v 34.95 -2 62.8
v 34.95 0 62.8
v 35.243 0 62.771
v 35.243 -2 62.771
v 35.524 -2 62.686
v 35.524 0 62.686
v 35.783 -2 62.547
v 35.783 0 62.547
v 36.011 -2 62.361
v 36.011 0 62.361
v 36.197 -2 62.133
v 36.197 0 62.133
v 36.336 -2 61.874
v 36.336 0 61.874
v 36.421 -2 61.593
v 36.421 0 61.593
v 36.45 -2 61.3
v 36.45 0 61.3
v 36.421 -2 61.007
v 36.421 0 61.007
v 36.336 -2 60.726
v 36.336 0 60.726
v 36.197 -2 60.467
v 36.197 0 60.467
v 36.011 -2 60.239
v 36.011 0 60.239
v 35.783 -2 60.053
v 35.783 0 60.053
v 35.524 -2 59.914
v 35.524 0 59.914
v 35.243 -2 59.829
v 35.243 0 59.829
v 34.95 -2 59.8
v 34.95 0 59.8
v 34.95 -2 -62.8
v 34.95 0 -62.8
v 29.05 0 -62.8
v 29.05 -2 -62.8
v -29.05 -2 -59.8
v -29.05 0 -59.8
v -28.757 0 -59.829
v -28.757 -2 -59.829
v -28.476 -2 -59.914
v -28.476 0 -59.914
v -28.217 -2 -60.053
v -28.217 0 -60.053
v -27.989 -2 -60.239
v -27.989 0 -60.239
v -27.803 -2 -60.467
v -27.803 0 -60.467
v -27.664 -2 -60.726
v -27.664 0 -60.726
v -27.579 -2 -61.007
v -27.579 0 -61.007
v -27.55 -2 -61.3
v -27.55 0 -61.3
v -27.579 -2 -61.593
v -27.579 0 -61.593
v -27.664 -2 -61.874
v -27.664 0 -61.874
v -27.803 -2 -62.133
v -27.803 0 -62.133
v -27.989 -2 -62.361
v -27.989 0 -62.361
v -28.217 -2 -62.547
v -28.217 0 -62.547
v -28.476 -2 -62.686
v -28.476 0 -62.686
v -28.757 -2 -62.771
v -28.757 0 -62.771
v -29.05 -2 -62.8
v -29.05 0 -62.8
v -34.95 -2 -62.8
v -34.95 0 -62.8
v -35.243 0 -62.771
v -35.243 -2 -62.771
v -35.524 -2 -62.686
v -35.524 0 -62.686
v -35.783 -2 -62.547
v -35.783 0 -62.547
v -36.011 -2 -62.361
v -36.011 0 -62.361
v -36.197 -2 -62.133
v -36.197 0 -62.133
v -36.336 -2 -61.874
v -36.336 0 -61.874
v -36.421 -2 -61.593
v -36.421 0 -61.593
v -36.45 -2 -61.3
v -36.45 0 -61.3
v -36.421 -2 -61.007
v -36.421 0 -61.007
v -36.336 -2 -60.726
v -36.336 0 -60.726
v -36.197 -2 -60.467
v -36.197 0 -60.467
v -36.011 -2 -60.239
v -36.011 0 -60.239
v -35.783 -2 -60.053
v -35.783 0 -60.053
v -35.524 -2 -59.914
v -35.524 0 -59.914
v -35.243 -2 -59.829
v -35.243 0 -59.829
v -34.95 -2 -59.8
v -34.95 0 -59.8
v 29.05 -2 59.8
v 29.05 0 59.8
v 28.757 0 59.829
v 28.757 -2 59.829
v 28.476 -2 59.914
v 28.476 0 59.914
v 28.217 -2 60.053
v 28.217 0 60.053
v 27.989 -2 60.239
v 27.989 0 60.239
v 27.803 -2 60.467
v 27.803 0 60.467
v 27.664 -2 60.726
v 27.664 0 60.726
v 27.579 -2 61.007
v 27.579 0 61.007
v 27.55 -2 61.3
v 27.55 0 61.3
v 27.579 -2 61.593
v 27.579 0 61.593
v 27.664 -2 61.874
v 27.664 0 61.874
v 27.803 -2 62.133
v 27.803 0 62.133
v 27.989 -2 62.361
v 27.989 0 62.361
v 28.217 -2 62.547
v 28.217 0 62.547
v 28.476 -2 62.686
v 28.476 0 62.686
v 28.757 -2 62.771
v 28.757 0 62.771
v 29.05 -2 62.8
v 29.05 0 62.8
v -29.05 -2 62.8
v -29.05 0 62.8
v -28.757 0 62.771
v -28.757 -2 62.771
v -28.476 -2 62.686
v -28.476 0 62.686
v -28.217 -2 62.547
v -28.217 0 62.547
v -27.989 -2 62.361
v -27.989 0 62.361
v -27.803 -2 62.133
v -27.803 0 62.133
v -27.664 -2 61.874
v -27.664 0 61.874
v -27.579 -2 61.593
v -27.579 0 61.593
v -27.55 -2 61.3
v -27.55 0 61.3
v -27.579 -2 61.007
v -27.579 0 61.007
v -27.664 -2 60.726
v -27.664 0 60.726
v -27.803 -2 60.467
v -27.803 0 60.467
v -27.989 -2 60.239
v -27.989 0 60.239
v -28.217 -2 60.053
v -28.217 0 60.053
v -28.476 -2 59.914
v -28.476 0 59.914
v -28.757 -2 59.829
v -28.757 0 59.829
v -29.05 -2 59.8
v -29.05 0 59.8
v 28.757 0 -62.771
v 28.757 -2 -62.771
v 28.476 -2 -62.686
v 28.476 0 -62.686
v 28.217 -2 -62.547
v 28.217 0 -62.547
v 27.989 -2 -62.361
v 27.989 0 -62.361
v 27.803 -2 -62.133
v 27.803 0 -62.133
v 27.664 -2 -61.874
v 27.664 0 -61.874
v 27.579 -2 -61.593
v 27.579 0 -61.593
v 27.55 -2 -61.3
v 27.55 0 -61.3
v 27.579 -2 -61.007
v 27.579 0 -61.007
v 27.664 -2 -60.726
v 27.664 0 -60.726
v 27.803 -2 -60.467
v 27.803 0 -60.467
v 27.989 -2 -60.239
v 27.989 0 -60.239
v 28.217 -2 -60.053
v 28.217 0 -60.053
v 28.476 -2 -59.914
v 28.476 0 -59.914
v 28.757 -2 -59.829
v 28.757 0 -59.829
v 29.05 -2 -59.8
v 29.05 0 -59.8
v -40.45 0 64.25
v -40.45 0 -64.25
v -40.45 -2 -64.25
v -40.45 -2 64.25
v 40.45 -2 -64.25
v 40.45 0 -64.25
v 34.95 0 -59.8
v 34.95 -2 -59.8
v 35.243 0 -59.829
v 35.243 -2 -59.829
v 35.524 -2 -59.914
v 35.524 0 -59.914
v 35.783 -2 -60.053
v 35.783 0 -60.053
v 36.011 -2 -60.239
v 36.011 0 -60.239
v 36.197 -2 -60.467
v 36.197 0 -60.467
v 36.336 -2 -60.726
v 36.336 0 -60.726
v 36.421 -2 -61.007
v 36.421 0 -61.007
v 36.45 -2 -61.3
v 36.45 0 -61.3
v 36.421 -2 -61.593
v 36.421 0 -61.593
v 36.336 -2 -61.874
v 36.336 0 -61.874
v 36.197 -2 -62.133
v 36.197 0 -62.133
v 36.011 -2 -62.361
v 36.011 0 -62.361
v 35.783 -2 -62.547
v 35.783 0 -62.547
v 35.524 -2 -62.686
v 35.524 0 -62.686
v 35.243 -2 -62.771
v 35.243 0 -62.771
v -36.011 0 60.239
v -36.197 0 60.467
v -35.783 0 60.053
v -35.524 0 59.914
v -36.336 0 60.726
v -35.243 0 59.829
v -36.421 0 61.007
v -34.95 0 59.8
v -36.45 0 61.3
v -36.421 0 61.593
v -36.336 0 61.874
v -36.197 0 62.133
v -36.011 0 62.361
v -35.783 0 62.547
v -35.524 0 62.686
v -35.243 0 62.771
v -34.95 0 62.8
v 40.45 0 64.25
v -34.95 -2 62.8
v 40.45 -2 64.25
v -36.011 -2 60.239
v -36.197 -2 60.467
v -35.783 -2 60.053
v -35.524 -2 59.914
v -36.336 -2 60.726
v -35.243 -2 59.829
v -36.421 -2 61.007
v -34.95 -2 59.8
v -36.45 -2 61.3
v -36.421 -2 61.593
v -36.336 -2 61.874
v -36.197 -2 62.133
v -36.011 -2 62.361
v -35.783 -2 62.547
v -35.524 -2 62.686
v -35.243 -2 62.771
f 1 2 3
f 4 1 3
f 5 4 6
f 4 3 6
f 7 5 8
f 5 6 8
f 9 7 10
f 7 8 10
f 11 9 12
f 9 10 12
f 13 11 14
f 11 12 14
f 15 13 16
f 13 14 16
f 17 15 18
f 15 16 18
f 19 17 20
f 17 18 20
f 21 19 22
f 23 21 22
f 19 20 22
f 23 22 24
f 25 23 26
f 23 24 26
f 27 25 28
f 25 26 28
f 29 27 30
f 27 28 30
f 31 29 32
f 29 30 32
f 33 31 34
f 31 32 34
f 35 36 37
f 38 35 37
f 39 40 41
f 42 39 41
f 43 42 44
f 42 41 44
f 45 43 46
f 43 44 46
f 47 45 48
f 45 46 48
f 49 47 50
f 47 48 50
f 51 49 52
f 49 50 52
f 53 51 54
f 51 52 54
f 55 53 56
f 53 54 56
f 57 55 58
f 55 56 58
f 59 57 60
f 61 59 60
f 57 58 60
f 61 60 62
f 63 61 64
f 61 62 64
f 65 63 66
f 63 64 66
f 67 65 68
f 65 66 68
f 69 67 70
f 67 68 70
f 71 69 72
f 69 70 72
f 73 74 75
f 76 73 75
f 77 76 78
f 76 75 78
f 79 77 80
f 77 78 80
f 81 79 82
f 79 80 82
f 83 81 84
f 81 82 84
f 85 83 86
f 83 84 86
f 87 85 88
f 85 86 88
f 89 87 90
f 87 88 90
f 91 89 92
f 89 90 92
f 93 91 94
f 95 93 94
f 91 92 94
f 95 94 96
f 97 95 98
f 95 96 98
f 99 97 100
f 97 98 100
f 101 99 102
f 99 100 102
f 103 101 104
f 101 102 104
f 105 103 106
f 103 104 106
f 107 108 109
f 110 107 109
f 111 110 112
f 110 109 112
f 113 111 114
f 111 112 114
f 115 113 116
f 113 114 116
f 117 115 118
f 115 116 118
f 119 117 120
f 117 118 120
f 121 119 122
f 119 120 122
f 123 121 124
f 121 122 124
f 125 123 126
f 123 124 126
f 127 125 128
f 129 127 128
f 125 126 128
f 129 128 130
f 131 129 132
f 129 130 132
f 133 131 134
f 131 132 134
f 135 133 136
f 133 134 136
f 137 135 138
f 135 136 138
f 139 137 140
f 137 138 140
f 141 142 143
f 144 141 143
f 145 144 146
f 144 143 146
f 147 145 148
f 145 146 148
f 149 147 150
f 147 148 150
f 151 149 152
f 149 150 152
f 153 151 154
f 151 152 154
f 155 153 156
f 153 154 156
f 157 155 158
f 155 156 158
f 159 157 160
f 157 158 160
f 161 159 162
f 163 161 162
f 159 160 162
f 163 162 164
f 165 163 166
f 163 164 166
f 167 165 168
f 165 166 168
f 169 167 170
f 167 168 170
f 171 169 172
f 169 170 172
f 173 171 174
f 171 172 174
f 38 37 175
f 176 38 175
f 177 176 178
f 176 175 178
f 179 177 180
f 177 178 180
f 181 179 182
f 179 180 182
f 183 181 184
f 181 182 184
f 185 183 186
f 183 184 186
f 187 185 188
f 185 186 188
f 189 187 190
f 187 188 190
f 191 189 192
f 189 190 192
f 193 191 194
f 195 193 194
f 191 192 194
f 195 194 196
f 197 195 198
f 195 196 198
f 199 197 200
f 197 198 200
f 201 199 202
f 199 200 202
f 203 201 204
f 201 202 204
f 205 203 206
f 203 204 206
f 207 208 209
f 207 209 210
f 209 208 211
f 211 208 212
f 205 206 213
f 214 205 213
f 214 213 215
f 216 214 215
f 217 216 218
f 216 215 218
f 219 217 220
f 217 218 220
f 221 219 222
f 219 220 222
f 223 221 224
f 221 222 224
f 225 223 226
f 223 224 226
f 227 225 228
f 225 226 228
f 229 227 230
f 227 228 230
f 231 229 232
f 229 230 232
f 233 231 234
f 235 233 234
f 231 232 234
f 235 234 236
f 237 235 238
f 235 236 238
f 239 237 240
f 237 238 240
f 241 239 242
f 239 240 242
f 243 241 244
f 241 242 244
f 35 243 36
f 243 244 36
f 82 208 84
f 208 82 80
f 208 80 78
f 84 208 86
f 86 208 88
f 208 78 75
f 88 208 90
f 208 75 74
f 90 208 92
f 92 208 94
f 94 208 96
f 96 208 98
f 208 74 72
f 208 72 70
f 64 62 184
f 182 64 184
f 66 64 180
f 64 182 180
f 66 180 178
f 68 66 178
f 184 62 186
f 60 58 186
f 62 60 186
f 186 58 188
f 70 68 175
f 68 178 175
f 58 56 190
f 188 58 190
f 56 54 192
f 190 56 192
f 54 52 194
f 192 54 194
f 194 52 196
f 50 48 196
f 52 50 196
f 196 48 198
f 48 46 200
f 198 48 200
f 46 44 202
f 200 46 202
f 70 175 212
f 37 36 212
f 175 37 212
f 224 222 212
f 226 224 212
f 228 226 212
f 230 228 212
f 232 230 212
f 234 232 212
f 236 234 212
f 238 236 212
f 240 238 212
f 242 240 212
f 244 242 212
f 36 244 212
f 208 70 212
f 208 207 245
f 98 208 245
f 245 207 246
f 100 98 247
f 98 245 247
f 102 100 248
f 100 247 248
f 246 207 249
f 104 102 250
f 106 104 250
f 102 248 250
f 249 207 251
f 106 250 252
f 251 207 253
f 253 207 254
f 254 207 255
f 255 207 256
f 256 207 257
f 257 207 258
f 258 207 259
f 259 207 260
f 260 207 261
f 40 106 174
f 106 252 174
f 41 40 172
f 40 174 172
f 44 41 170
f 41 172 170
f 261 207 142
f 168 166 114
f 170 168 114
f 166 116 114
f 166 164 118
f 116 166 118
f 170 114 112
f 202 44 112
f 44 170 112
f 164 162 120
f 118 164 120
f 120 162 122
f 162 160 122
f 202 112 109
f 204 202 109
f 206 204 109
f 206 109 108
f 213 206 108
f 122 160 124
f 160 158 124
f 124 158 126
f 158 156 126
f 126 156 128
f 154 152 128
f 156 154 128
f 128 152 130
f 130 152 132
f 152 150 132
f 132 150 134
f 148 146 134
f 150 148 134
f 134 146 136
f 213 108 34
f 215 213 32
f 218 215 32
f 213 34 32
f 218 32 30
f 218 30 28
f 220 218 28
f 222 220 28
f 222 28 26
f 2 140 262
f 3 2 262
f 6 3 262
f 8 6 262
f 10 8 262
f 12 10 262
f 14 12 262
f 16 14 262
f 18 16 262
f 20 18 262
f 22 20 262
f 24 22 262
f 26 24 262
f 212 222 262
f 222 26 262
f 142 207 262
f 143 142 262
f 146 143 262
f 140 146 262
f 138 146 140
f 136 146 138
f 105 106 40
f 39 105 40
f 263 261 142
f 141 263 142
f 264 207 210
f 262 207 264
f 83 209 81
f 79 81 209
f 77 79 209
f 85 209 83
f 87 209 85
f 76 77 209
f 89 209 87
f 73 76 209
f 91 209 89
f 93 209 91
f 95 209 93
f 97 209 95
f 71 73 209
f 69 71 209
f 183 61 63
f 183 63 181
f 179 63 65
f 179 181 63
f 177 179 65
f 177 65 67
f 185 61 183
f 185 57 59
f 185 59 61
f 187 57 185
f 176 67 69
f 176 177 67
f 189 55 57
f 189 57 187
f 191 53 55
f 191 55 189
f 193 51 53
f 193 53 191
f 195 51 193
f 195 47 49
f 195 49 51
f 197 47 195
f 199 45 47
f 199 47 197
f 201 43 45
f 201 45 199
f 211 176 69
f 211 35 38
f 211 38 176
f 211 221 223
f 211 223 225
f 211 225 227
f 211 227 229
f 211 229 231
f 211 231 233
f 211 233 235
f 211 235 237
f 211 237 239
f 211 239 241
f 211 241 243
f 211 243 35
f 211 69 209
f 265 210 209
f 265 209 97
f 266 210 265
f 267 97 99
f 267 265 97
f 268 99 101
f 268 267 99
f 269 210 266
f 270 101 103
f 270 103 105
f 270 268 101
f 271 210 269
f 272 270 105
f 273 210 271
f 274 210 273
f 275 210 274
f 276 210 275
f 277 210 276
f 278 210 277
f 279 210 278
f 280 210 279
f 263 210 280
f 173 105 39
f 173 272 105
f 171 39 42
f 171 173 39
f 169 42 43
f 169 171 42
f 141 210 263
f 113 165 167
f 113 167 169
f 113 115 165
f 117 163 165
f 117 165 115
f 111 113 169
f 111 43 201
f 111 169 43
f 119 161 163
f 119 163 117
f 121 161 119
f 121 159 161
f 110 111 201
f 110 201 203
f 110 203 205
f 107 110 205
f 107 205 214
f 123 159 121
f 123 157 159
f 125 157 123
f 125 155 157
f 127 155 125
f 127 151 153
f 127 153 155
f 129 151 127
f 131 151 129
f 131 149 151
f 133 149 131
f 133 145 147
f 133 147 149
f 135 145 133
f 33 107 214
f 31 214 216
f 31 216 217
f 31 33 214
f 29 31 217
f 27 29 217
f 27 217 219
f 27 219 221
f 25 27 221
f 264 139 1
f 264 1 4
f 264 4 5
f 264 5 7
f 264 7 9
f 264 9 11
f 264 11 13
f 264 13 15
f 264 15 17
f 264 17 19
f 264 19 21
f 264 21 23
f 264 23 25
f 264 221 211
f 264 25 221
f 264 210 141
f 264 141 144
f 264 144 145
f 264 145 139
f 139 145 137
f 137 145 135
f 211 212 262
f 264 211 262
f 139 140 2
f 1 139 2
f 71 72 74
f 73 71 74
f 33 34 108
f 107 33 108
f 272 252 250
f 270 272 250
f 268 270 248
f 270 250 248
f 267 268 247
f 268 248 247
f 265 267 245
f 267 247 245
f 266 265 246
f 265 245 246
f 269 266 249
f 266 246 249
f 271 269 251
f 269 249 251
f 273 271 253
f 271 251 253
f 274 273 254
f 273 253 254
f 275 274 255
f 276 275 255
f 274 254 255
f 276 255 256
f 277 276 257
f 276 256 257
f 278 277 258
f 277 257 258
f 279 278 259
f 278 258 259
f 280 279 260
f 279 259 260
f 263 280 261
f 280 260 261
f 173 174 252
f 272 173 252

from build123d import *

# Parameters (mm, degrees)
F0_W     = 80.9
F0_H     = 128.5
F1_DEPTH = 2


with BuildPart() as f1:
    # F0 (on Front) → F1 (new body)
    with BuildSketch(Plane.XZ):
        Rectangle(F0_W, F0_H)
        with BuildLine():
            ThreePointArc((-34.95, -62.8), (-36.45, -61.3), (-34.95, -59.8))
            Line((-34.95, -59.8), (-29.05, -59.8))
            ThreePointArc((-29.05, -59.8), (-27.55, -61.3), (-29.05, -62.8))
            Line((-29.05, -62.8), (-34.95, -62.8))
        make_face(mode=Mode.SUBTRACT)
        with BuildLine():
            ThreePointArc((29.05, -62.8), (27.55, -61.3), (29.05, -59.8))
            Line((29.05, -59.8), (34.95, -59.8))
            ThreePointArc((34.95, -59.8), (36.45, -61.3), (34.95, -62.8))
            Line((34.95, -62.8), (29.05, -62.8))
        make_face(mode=Mode.SUBTRACT)
        with BuildLine():
            ThreePointArc((-34.95, 59.8), (-36.45, 61.3), (-34.95, 62.8))
            Line((-34.95, 62.8), (-29.05, 62.8))
            ThreePointArc((-29.05, 62.8), (-27.55, 61.3), (-29.05, 59.8))
            Line((-29.05, 59.8), (-34.95, 59.8))
        make_face(mode=Mode.SUBTRACT)
        with BuildLine():
            ThreePointArc((29.05, 59.8), (27.55, 61.3), (29.05, 62.8))
            Line((29.05, 62.8), (34.95, 62.8))
            ThreePointArc((34.95, 62.8), (36.45, 61.3), (34.95, 59.8))
            Line((34.95, 59.8), (29.05, 59.8))
        make_face(mode=Mode.SUBTRACT)
    extrude(amount=F1_DEPTH)


solid = f1.part
